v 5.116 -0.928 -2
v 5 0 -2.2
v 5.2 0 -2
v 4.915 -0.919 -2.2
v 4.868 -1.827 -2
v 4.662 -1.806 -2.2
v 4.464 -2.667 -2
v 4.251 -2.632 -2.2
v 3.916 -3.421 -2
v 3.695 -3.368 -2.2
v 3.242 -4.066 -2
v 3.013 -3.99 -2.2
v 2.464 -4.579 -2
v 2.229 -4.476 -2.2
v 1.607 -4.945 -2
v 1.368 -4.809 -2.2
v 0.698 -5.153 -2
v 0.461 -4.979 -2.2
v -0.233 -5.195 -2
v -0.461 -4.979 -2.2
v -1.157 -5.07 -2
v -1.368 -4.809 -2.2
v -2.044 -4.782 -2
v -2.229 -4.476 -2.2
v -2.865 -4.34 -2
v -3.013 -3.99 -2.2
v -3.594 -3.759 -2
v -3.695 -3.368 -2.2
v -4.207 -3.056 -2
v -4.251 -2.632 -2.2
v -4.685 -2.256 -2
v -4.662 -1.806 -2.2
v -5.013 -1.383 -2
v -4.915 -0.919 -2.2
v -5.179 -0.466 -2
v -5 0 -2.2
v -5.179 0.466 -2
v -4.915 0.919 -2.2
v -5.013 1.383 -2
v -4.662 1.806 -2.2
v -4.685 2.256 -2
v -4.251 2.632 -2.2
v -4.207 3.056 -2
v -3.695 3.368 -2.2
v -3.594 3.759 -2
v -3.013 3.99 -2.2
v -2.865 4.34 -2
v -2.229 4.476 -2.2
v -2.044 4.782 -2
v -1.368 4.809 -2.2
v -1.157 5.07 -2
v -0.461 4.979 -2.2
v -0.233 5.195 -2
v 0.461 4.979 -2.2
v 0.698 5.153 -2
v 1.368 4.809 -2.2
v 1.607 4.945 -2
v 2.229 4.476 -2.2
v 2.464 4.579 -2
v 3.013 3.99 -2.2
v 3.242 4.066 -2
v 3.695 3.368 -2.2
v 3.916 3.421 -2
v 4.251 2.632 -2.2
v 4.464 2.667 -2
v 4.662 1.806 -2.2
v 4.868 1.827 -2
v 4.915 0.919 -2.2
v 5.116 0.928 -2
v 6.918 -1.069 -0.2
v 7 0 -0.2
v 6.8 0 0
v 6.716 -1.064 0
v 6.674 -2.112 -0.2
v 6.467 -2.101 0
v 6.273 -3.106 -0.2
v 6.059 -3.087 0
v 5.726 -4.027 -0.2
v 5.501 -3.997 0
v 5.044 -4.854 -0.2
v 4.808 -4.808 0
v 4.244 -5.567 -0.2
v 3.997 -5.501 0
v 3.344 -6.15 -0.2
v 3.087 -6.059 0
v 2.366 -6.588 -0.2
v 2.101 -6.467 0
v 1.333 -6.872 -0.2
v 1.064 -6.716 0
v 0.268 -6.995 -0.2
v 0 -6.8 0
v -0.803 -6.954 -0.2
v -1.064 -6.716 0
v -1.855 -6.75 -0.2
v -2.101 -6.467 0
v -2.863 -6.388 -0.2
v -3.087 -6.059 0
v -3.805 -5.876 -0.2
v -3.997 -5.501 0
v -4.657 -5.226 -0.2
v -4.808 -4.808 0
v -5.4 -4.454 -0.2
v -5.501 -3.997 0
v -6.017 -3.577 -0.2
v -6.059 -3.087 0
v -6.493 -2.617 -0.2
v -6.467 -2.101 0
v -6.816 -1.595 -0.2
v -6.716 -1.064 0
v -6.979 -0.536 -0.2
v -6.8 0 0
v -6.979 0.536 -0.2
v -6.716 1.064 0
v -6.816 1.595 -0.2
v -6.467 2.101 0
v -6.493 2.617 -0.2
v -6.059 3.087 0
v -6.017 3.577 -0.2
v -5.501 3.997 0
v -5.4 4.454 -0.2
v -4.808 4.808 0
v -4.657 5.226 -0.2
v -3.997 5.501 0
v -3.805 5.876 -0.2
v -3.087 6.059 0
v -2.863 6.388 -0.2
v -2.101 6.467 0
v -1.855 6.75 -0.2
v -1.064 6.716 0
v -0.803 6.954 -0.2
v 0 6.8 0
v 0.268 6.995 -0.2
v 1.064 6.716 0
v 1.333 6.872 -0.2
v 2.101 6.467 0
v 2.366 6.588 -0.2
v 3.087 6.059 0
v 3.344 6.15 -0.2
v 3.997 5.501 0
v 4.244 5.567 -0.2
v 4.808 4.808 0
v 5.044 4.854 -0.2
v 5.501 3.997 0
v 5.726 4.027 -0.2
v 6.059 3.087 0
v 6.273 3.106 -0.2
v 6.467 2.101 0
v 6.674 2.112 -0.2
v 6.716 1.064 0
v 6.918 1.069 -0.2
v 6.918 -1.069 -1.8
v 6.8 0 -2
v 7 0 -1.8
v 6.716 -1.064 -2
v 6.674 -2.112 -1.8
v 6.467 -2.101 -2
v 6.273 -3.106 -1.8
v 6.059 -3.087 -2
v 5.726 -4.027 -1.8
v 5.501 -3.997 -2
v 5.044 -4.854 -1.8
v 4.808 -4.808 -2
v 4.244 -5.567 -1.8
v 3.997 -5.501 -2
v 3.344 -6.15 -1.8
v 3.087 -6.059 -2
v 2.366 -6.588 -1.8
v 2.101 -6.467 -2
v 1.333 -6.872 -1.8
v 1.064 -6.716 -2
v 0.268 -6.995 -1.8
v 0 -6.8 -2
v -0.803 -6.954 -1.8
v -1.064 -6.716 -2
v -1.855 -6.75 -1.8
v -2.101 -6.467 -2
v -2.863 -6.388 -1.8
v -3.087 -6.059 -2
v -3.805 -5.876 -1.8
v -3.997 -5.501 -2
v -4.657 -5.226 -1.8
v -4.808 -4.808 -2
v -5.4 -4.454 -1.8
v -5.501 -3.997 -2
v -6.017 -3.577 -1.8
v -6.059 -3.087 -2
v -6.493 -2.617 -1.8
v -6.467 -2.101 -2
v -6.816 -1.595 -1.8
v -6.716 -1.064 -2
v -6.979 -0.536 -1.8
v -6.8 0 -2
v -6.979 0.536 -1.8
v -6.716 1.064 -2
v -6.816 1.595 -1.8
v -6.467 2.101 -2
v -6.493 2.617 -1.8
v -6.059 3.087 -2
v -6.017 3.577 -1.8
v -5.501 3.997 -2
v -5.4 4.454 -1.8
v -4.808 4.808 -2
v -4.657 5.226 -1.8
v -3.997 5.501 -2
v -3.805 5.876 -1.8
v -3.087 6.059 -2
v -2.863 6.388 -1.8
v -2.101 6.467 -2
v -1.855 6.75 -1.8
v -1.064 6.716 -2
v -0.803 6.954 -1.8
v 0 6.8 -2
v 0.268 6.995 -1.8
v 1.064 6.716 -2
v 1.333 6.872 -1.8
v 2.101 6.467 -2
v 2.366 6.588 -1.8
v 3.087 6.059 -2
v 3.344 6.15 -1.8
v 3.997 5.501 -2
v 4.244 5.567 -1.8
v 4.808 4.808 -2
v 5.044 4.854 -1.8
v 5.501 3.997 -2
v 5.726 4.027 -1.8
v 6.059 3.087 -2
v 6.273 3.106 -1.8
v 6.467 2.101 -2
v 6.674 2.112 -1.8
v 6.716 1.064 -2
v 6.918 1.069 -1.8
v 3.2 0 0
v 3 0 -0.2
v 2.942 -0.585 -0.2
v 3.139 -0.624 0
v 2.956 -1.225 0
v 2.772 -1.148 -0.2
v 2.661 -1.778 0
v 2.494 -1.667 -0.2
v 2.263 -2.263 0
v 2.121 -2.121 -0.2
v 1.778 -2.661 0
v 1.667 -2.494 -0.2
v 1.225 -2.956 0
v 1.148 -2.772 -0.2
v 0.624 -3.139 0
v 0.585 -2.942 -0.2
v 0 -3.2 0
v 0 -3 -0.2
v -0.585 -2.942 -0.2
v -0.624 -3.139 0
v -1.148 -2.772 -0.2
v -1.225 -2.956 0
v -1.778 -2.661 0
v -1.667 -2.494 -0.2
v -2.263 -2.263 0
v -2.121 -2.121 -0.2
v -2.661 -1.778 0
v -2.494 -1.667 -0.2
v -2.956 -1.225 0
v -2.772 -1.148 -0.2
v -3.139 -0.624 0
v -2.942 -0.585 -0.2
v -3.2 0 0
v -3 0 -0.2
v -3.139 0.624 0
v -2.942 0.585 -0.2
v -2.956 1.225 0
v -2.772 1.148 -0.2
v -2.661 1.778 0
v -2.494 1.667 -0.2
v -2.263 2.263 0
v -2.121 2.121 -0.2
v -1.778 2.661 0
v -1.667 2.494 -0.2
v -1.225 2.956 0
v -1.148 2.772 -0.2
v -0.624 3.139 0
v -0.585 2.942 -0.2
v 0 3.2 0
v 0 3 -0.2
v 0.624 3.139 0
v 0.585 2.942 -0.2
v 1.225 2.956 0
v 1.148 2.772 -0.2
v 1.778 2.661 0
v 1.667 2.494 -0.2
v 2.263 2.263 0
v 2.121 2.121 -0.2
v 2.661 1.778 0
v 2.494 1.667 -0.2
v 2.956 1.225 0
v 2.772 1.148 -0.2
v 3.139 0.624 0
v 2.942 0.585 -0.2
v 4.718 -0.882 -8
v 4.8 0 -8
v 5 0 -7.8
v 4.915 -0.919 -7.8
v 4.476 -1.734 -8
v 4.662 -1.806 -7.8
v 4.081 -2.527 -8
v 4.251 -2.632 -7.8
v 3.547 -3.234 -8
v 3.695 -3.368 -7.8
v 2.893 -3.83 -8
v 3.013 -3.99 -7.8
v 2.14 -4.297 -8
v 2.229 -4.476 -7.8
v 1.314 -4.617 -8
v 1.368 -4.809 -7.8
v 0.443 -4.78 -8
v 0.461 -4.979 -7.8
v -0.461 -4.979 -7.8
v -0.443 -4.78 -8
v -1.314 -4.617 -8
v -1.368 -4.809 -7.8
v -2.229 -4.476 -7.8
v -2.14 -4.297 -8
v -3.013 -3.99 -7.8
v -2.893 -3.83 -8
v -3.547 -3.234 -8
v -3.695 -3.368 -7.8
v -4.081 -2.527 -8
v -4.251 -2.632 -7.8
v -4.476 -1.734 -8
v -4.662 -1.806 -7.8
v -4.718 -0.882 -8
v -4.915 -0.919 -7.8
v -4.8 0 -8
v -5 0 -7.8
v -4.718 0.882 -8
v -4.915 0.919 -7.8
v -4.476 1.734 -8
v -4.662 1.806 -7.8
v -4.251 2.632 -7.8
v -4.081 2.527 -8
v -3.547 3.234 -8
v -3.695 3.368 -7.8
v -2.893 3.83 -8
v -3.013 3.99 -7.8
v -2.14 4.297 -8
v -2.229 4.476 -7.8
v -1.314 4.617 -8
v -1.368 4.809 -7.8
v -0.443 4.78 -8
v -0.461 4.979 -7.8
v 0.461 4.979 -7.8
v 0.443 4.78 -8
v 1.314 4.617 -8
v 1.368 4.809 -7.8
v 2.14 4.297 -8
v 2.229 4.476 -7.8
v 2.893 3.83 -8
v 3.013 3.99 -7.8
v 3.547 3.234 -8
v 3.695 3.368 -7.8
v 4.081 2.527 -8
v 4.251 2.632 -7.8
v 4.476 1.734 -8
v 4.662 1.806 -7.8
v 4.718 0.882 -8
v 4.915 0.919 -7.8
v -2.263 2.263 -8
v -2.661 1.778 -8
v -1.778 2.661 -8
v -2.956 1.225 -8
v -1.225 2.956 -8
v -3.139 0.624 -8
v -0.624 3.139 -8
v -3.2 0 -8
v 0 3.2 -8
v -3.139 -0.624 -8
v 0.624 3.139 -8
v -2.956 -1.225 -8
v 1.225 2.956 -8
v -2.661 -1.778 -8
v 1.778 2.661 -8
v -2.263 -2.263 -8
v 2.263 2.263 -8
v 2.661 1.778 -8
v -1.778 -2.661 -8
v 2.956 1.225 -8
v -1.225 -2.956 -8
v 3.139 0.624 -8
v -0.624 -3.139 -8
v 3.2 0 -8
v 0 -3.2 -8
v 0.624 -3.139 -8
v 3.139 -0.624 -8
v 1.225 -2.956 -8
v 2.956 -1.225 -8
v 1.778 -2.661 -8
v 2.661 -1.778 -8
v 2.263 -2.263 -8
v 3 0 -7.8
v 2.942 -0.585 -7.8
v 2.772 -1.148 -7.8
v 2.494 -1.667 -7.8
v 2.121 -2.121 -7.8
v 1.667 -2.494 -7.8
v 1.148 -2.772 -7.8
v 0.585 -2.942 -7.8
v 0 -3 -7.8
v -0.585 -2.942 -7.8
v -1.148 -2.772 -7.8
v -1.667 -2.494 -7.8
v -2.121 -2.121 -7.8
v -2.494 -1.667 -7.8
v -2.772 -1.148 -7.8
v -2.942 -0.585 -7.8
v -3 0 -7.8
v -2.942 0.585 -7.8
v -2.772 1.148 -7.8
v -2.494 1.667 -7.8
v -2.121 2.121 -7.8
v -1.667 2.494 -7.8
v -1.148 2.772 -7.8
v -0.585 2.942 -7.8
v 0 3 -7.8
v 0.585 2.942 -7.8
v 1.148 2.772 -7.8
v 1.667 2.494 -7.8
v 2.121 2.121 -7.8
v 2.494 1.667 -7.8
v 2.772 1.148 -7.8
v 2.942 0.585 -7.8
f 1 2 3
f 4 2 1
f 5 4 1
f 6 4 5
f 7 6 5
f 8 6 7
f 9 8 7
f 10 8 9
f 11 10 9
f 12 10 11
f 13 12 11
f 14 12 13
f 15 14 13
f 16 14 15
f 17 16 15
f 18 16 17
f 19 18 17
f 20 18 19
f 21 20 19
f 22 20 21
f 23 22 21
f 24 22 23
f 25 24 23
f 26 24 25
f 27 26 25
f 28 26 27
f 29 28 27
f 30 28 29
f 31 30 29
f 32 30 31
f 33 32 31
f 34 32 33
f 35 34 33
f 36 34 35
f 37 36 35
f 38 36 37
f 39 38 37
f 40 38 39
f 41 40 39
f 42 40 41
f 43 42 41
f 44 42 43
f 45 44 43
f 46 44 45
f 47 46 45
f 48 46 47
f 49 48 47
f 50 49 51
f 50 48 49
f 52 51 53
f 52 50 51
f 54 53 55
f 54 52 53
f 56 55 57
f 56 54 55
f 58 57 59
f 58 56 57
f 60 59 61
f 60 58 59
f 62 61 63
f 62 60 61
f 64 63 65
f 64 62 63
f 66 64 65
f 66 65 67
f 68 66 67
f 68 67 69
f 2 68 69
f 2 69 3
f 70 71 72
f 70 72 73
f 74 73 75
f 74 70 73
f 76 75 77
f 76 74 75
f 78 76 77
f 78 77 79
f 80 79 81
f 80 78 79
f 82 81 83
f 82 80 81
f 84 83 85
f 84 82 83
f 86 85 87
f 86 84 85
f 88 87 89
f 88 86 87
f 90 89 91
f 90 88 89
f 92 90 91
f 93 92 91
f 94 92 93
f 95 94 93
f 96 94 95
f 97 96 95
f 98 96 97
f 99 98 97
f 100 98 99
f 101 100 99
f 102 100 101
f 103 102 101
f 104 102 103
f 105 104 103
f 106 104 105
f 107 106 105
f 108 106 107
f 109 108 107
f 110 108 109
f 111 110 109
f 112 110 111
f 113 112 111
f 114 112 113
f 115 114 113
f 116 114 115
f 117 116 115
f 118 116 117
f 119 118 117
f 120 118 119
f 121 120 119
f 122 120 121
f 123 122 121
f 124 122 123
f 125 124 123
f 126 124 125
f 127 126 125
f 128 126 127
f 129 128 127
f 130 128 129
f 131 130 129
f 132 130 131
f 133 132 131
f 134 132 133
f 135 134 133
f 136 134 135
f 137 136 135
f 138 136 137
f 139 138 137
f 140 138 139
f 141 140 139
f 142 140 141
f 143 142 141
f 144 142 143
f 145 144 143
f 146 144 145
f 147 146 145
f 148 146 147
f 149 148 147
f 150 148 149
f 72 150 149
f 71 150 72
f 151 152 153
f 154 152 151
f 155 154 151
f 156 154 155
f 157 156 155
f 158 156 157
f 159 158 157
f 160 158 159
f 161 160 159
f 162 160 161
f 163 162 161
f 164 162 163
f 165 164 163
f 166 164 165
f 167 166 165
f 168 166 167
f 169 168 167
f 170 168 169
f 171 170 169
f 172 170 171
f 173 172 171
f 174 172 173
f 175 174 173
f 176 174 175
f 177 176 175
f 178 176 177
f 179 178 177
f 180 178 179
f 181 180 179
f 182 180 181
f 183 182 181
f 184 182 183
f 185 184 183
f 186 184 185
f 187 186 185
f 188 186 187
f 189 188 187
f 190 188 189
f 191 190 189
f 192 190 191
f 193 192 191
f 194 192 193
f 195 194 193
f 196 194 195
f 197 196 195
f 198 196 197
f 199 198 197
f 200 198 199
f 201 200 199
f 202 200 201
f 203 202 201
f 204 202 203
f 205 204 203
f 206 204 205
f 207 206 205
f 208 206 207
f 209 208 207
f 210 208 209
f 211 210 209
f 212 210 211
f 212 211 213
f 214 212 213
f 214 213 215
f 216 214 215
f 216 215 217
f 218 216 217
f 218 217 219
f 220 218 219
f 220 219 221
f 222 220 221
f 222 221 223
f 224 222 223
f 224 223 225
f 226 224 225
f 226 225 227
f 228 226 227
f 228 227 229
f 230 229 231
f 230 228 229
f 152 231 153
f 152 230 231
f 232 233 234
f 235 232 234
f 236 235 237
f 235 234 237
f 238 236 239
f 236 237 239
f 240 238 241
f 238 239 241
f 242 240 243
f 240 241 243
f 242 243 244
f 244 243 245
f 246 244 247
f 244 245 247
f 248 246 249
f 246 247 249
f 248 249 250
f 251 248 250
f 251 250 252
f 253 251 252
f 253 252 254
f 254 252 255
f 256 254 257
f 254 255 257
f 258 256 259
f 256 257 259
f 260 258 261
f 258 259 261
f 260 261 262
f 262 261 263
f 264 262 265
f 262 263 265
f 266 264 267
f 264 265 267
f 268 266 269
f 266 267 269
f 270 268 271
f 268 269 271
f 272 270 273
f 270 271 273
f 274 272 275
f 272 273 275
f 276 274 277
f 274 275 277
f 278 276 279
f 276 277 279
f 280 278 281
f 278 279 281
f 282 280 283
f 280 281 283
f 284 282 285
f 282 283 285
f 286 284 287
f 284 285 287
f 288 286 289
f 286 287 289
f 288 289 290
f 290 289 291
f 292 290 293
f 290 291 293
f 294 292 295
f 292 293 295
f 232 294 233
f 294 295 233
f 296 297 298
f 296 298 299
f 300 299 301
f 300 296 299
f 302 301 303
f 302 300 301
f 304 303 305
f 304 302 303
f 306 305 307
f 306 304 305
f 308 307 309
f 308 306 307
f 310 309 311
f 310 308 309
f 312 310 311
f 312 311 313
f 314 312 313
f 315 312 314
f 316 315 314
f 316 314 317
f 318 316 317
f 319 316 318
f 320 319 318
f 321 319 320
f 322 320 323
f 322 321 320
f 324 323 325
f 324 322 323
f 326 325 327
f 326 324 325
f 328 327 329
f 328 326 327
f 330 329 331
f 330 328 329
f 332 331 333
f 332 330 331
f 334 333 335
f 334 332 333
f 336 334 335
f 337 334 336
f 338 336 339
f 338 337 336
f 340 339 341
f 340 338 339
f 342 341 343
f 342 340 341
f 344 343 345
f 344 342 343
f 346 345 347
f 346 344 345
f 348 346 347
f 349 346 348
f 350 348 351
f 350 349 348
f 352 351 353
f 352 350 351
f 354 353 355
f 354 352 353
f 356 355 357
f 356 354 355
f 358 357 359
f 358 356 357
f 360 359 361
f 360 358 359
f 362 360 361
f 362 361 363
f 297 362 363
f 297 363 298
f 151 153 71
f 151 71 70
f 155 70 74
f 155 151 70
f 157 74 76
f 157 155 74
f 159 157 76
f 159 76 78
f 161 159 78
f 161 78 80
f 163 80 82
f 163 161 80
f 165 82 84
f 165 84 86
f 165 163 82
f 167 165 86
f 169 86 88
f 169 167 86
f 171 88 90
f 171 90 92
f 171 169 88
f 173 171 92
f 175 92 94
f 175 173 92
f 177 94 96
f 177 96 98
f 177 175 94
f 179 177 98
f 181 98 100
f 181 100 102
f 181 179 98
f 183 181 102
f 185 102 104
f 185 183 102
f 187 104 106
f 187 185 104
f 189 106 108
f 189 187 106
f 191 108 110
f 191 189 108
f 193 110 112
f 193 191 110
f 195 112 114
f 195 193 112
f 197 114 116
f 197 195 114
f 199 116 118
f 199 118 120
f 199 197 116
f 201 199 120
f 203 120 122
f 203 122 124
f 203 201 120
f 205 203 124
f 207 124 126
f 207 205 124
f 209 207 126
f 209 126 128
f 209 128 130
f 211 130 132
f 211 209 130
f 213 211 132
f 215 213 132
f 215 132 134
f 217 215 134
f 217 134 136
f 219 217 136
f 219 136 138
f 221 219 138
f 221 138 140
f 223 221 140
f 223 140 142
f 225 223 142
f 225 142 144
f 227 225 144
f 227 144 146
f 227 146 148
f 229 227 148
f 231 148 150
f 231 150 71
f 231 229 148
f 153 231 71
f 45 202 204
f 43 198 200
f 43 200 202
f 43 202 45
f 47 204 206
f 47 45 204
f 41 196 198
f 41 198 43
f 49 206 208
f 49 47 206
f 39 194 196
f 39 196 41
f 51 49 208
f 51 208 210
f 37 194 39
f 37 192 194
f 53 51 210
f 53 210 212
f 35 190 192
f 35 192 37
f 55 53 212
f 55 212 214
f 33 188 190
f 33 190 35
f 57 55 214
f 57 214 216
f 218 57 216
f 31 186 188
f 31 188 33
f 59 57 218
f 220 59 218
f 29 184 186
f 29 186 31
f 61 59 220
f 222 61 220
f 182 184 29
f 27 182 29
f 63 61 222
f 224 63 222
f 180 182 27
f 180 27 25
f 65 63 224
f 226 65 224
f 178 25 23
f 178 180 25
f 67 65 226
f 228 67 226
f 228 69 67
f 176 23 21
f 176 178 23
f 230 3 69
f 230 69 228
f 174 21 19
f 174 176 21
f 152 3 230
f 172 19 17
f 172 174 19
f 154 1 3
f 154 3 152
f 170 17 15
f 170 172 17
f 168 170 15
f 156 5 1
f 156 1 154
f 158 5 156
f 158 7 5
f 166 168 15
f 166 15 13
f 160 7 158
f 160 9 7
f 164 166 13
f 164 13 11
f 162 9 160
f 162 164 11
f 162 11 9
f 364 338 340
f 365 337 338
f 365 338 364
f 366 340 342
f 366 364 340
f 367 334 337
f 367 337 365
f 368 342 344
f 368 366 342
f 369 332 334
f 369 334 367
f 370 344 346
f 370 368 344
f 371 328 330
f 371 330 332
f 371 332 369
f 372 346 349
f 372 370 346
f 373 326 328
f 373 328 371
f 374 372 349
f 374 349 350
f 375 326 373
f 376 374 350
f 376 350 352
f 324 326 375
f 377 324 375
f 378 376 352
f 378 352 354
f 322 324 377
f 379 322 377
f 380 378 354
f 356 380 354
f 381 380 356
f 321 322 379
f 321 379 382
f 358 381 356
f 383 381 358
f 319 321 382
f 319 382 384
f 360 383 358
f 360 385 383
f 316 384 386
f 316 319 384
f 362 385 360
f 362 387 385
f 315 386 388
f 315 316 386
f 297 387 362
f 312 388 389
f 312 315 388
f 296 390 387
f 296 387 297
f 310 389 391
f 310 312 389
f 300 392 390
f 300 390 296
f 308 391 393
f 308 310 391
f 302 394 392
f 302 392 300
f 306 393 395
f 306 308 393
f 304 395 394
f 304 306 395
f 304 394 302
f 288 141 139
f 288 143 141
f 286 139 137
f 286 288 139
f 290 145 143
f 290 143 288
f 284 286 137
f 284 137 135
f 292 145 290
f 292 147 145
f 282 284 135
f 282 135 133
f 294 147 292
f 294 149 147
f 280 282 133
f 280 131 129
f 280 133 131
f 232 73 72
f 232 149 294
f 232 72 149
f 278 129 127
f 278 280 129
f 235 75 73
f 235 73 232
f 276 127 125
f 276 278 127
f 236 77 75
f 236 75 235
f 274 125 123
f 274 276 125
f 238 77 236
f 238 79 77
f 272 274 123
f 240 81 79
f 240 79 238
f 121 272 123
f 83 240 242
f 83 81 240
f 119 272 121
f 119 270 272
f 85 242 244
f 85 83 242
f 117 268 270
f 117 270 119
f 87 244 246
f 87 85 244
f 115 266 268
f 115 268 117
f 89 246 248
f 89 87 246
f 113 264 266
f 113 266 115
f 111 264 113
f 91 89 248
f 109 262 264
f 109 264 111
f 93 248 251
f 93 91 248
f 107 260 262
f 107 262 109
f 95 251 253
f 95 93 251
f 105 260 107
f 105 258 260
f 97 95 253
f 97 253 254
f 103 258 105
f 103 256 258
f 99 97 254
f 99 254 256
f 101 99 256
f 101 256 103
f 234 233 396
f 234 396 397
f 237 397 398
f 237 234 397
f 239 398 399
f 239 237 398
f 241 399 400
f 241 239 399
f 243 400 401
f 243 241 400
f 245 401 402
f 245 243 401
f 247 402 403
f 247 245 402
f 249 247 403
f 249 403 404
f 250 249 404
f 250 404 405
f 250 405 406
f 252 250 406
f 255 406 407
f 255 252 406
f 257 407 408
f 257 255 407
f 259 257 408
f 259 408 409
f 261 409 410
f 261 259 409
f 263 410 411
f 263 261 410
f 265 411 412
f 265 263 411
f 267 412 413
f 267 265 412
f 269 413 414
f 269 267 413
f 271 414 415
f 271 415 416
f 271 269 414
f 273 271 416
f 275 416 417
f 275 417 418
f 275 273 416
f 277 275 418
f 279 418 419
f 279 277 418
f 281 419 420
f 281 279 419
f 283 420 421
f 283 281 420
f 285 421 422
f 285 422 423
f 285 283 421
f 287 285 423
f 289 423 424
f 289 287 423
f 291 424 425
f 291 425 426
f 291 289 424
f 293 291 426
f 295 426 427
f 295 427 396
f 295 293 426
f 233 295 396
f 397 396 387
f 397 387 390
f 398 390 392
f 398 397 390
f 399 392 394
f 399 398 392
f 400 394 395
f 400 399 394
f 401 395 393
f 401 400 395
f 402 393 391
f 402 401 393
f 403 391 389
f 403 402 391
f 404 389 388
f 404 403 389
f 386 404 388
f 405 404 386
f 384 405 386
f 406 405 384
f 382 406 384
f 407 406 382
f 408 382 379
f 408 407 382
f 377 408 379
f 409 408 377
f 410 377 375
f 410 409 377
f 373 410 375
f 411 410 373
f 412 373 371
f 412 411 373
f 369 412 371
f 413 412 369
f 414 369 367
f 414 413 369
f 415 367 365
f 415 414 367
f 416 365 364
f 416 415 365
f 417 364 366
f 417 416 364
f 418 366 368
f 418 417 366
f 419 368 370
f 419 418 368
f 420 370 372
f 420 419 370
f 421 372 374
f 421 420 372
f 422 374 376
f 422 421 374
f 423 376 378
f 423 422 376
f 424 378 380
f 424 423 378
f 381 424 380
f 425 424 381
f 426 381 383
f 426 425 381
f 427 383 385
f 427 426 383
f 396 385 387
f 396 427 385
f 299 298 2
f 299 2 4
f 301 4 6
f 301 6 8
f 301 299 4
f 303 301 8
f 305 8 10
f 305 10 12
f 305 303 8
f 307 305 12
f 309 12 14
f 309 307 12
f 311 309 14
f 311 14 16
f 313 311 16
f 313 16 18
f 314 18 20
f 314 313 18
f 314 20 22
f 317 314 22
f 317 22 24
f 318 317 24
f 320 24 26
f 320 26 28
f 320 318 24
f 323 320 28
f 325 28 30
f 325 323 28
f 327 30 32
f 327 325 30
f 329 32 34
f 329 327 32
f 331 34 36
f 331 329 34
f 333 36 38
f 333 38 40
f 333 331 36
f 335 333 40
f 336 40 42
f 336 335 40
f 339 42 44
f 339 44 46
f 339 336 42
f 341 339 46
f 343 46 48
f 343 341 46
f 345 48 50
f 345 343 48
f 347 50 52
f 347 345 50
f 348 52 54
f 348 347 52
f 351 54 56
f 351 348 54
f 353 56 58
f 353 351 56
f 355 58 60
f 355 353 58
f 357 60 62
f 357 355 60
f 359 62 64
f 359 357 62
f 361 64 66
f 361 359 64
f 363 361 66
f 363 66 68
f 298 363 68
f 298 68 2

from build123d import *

# Parameters (mm, degrees)
CHAMFER1_SIZE = 0.2


with BuildPart() as part:
    # Sketch1 → Revolve1 (revolve)
    with BuildSketch(Plane(origin=(0, 0, 0), x_dir=(0, 0, -1), z_dir=(1, 0, 0)), mode=Mode.PRIVATE) as revolve1_sk:
        Polygon((0, 3), (0, 7), (2, 7), (2, 5), (8, 5), (8, 3), align=None)
    revolve(revolve1_sk.sketch.rotate(Axis((0, 0, 0), (0, 0, -1)), 90), axis=Axis((0, 0, 0), (0, 0, -1)))

    # Chamfer1
    chamfer1_edges = [part.edges().sort_by_distance(p)[0] for p in [
        (-3, 0, -8),
        (-5, 0, -8),
        (-5, 0, -2),
        (-7, 0, -2),
        (-7, 0, 0),
        (-3, 0, 0),
    ]]
    chamfer(chamfer1_edges, length=CHAMFER1_SIZE)


solid = part.part
